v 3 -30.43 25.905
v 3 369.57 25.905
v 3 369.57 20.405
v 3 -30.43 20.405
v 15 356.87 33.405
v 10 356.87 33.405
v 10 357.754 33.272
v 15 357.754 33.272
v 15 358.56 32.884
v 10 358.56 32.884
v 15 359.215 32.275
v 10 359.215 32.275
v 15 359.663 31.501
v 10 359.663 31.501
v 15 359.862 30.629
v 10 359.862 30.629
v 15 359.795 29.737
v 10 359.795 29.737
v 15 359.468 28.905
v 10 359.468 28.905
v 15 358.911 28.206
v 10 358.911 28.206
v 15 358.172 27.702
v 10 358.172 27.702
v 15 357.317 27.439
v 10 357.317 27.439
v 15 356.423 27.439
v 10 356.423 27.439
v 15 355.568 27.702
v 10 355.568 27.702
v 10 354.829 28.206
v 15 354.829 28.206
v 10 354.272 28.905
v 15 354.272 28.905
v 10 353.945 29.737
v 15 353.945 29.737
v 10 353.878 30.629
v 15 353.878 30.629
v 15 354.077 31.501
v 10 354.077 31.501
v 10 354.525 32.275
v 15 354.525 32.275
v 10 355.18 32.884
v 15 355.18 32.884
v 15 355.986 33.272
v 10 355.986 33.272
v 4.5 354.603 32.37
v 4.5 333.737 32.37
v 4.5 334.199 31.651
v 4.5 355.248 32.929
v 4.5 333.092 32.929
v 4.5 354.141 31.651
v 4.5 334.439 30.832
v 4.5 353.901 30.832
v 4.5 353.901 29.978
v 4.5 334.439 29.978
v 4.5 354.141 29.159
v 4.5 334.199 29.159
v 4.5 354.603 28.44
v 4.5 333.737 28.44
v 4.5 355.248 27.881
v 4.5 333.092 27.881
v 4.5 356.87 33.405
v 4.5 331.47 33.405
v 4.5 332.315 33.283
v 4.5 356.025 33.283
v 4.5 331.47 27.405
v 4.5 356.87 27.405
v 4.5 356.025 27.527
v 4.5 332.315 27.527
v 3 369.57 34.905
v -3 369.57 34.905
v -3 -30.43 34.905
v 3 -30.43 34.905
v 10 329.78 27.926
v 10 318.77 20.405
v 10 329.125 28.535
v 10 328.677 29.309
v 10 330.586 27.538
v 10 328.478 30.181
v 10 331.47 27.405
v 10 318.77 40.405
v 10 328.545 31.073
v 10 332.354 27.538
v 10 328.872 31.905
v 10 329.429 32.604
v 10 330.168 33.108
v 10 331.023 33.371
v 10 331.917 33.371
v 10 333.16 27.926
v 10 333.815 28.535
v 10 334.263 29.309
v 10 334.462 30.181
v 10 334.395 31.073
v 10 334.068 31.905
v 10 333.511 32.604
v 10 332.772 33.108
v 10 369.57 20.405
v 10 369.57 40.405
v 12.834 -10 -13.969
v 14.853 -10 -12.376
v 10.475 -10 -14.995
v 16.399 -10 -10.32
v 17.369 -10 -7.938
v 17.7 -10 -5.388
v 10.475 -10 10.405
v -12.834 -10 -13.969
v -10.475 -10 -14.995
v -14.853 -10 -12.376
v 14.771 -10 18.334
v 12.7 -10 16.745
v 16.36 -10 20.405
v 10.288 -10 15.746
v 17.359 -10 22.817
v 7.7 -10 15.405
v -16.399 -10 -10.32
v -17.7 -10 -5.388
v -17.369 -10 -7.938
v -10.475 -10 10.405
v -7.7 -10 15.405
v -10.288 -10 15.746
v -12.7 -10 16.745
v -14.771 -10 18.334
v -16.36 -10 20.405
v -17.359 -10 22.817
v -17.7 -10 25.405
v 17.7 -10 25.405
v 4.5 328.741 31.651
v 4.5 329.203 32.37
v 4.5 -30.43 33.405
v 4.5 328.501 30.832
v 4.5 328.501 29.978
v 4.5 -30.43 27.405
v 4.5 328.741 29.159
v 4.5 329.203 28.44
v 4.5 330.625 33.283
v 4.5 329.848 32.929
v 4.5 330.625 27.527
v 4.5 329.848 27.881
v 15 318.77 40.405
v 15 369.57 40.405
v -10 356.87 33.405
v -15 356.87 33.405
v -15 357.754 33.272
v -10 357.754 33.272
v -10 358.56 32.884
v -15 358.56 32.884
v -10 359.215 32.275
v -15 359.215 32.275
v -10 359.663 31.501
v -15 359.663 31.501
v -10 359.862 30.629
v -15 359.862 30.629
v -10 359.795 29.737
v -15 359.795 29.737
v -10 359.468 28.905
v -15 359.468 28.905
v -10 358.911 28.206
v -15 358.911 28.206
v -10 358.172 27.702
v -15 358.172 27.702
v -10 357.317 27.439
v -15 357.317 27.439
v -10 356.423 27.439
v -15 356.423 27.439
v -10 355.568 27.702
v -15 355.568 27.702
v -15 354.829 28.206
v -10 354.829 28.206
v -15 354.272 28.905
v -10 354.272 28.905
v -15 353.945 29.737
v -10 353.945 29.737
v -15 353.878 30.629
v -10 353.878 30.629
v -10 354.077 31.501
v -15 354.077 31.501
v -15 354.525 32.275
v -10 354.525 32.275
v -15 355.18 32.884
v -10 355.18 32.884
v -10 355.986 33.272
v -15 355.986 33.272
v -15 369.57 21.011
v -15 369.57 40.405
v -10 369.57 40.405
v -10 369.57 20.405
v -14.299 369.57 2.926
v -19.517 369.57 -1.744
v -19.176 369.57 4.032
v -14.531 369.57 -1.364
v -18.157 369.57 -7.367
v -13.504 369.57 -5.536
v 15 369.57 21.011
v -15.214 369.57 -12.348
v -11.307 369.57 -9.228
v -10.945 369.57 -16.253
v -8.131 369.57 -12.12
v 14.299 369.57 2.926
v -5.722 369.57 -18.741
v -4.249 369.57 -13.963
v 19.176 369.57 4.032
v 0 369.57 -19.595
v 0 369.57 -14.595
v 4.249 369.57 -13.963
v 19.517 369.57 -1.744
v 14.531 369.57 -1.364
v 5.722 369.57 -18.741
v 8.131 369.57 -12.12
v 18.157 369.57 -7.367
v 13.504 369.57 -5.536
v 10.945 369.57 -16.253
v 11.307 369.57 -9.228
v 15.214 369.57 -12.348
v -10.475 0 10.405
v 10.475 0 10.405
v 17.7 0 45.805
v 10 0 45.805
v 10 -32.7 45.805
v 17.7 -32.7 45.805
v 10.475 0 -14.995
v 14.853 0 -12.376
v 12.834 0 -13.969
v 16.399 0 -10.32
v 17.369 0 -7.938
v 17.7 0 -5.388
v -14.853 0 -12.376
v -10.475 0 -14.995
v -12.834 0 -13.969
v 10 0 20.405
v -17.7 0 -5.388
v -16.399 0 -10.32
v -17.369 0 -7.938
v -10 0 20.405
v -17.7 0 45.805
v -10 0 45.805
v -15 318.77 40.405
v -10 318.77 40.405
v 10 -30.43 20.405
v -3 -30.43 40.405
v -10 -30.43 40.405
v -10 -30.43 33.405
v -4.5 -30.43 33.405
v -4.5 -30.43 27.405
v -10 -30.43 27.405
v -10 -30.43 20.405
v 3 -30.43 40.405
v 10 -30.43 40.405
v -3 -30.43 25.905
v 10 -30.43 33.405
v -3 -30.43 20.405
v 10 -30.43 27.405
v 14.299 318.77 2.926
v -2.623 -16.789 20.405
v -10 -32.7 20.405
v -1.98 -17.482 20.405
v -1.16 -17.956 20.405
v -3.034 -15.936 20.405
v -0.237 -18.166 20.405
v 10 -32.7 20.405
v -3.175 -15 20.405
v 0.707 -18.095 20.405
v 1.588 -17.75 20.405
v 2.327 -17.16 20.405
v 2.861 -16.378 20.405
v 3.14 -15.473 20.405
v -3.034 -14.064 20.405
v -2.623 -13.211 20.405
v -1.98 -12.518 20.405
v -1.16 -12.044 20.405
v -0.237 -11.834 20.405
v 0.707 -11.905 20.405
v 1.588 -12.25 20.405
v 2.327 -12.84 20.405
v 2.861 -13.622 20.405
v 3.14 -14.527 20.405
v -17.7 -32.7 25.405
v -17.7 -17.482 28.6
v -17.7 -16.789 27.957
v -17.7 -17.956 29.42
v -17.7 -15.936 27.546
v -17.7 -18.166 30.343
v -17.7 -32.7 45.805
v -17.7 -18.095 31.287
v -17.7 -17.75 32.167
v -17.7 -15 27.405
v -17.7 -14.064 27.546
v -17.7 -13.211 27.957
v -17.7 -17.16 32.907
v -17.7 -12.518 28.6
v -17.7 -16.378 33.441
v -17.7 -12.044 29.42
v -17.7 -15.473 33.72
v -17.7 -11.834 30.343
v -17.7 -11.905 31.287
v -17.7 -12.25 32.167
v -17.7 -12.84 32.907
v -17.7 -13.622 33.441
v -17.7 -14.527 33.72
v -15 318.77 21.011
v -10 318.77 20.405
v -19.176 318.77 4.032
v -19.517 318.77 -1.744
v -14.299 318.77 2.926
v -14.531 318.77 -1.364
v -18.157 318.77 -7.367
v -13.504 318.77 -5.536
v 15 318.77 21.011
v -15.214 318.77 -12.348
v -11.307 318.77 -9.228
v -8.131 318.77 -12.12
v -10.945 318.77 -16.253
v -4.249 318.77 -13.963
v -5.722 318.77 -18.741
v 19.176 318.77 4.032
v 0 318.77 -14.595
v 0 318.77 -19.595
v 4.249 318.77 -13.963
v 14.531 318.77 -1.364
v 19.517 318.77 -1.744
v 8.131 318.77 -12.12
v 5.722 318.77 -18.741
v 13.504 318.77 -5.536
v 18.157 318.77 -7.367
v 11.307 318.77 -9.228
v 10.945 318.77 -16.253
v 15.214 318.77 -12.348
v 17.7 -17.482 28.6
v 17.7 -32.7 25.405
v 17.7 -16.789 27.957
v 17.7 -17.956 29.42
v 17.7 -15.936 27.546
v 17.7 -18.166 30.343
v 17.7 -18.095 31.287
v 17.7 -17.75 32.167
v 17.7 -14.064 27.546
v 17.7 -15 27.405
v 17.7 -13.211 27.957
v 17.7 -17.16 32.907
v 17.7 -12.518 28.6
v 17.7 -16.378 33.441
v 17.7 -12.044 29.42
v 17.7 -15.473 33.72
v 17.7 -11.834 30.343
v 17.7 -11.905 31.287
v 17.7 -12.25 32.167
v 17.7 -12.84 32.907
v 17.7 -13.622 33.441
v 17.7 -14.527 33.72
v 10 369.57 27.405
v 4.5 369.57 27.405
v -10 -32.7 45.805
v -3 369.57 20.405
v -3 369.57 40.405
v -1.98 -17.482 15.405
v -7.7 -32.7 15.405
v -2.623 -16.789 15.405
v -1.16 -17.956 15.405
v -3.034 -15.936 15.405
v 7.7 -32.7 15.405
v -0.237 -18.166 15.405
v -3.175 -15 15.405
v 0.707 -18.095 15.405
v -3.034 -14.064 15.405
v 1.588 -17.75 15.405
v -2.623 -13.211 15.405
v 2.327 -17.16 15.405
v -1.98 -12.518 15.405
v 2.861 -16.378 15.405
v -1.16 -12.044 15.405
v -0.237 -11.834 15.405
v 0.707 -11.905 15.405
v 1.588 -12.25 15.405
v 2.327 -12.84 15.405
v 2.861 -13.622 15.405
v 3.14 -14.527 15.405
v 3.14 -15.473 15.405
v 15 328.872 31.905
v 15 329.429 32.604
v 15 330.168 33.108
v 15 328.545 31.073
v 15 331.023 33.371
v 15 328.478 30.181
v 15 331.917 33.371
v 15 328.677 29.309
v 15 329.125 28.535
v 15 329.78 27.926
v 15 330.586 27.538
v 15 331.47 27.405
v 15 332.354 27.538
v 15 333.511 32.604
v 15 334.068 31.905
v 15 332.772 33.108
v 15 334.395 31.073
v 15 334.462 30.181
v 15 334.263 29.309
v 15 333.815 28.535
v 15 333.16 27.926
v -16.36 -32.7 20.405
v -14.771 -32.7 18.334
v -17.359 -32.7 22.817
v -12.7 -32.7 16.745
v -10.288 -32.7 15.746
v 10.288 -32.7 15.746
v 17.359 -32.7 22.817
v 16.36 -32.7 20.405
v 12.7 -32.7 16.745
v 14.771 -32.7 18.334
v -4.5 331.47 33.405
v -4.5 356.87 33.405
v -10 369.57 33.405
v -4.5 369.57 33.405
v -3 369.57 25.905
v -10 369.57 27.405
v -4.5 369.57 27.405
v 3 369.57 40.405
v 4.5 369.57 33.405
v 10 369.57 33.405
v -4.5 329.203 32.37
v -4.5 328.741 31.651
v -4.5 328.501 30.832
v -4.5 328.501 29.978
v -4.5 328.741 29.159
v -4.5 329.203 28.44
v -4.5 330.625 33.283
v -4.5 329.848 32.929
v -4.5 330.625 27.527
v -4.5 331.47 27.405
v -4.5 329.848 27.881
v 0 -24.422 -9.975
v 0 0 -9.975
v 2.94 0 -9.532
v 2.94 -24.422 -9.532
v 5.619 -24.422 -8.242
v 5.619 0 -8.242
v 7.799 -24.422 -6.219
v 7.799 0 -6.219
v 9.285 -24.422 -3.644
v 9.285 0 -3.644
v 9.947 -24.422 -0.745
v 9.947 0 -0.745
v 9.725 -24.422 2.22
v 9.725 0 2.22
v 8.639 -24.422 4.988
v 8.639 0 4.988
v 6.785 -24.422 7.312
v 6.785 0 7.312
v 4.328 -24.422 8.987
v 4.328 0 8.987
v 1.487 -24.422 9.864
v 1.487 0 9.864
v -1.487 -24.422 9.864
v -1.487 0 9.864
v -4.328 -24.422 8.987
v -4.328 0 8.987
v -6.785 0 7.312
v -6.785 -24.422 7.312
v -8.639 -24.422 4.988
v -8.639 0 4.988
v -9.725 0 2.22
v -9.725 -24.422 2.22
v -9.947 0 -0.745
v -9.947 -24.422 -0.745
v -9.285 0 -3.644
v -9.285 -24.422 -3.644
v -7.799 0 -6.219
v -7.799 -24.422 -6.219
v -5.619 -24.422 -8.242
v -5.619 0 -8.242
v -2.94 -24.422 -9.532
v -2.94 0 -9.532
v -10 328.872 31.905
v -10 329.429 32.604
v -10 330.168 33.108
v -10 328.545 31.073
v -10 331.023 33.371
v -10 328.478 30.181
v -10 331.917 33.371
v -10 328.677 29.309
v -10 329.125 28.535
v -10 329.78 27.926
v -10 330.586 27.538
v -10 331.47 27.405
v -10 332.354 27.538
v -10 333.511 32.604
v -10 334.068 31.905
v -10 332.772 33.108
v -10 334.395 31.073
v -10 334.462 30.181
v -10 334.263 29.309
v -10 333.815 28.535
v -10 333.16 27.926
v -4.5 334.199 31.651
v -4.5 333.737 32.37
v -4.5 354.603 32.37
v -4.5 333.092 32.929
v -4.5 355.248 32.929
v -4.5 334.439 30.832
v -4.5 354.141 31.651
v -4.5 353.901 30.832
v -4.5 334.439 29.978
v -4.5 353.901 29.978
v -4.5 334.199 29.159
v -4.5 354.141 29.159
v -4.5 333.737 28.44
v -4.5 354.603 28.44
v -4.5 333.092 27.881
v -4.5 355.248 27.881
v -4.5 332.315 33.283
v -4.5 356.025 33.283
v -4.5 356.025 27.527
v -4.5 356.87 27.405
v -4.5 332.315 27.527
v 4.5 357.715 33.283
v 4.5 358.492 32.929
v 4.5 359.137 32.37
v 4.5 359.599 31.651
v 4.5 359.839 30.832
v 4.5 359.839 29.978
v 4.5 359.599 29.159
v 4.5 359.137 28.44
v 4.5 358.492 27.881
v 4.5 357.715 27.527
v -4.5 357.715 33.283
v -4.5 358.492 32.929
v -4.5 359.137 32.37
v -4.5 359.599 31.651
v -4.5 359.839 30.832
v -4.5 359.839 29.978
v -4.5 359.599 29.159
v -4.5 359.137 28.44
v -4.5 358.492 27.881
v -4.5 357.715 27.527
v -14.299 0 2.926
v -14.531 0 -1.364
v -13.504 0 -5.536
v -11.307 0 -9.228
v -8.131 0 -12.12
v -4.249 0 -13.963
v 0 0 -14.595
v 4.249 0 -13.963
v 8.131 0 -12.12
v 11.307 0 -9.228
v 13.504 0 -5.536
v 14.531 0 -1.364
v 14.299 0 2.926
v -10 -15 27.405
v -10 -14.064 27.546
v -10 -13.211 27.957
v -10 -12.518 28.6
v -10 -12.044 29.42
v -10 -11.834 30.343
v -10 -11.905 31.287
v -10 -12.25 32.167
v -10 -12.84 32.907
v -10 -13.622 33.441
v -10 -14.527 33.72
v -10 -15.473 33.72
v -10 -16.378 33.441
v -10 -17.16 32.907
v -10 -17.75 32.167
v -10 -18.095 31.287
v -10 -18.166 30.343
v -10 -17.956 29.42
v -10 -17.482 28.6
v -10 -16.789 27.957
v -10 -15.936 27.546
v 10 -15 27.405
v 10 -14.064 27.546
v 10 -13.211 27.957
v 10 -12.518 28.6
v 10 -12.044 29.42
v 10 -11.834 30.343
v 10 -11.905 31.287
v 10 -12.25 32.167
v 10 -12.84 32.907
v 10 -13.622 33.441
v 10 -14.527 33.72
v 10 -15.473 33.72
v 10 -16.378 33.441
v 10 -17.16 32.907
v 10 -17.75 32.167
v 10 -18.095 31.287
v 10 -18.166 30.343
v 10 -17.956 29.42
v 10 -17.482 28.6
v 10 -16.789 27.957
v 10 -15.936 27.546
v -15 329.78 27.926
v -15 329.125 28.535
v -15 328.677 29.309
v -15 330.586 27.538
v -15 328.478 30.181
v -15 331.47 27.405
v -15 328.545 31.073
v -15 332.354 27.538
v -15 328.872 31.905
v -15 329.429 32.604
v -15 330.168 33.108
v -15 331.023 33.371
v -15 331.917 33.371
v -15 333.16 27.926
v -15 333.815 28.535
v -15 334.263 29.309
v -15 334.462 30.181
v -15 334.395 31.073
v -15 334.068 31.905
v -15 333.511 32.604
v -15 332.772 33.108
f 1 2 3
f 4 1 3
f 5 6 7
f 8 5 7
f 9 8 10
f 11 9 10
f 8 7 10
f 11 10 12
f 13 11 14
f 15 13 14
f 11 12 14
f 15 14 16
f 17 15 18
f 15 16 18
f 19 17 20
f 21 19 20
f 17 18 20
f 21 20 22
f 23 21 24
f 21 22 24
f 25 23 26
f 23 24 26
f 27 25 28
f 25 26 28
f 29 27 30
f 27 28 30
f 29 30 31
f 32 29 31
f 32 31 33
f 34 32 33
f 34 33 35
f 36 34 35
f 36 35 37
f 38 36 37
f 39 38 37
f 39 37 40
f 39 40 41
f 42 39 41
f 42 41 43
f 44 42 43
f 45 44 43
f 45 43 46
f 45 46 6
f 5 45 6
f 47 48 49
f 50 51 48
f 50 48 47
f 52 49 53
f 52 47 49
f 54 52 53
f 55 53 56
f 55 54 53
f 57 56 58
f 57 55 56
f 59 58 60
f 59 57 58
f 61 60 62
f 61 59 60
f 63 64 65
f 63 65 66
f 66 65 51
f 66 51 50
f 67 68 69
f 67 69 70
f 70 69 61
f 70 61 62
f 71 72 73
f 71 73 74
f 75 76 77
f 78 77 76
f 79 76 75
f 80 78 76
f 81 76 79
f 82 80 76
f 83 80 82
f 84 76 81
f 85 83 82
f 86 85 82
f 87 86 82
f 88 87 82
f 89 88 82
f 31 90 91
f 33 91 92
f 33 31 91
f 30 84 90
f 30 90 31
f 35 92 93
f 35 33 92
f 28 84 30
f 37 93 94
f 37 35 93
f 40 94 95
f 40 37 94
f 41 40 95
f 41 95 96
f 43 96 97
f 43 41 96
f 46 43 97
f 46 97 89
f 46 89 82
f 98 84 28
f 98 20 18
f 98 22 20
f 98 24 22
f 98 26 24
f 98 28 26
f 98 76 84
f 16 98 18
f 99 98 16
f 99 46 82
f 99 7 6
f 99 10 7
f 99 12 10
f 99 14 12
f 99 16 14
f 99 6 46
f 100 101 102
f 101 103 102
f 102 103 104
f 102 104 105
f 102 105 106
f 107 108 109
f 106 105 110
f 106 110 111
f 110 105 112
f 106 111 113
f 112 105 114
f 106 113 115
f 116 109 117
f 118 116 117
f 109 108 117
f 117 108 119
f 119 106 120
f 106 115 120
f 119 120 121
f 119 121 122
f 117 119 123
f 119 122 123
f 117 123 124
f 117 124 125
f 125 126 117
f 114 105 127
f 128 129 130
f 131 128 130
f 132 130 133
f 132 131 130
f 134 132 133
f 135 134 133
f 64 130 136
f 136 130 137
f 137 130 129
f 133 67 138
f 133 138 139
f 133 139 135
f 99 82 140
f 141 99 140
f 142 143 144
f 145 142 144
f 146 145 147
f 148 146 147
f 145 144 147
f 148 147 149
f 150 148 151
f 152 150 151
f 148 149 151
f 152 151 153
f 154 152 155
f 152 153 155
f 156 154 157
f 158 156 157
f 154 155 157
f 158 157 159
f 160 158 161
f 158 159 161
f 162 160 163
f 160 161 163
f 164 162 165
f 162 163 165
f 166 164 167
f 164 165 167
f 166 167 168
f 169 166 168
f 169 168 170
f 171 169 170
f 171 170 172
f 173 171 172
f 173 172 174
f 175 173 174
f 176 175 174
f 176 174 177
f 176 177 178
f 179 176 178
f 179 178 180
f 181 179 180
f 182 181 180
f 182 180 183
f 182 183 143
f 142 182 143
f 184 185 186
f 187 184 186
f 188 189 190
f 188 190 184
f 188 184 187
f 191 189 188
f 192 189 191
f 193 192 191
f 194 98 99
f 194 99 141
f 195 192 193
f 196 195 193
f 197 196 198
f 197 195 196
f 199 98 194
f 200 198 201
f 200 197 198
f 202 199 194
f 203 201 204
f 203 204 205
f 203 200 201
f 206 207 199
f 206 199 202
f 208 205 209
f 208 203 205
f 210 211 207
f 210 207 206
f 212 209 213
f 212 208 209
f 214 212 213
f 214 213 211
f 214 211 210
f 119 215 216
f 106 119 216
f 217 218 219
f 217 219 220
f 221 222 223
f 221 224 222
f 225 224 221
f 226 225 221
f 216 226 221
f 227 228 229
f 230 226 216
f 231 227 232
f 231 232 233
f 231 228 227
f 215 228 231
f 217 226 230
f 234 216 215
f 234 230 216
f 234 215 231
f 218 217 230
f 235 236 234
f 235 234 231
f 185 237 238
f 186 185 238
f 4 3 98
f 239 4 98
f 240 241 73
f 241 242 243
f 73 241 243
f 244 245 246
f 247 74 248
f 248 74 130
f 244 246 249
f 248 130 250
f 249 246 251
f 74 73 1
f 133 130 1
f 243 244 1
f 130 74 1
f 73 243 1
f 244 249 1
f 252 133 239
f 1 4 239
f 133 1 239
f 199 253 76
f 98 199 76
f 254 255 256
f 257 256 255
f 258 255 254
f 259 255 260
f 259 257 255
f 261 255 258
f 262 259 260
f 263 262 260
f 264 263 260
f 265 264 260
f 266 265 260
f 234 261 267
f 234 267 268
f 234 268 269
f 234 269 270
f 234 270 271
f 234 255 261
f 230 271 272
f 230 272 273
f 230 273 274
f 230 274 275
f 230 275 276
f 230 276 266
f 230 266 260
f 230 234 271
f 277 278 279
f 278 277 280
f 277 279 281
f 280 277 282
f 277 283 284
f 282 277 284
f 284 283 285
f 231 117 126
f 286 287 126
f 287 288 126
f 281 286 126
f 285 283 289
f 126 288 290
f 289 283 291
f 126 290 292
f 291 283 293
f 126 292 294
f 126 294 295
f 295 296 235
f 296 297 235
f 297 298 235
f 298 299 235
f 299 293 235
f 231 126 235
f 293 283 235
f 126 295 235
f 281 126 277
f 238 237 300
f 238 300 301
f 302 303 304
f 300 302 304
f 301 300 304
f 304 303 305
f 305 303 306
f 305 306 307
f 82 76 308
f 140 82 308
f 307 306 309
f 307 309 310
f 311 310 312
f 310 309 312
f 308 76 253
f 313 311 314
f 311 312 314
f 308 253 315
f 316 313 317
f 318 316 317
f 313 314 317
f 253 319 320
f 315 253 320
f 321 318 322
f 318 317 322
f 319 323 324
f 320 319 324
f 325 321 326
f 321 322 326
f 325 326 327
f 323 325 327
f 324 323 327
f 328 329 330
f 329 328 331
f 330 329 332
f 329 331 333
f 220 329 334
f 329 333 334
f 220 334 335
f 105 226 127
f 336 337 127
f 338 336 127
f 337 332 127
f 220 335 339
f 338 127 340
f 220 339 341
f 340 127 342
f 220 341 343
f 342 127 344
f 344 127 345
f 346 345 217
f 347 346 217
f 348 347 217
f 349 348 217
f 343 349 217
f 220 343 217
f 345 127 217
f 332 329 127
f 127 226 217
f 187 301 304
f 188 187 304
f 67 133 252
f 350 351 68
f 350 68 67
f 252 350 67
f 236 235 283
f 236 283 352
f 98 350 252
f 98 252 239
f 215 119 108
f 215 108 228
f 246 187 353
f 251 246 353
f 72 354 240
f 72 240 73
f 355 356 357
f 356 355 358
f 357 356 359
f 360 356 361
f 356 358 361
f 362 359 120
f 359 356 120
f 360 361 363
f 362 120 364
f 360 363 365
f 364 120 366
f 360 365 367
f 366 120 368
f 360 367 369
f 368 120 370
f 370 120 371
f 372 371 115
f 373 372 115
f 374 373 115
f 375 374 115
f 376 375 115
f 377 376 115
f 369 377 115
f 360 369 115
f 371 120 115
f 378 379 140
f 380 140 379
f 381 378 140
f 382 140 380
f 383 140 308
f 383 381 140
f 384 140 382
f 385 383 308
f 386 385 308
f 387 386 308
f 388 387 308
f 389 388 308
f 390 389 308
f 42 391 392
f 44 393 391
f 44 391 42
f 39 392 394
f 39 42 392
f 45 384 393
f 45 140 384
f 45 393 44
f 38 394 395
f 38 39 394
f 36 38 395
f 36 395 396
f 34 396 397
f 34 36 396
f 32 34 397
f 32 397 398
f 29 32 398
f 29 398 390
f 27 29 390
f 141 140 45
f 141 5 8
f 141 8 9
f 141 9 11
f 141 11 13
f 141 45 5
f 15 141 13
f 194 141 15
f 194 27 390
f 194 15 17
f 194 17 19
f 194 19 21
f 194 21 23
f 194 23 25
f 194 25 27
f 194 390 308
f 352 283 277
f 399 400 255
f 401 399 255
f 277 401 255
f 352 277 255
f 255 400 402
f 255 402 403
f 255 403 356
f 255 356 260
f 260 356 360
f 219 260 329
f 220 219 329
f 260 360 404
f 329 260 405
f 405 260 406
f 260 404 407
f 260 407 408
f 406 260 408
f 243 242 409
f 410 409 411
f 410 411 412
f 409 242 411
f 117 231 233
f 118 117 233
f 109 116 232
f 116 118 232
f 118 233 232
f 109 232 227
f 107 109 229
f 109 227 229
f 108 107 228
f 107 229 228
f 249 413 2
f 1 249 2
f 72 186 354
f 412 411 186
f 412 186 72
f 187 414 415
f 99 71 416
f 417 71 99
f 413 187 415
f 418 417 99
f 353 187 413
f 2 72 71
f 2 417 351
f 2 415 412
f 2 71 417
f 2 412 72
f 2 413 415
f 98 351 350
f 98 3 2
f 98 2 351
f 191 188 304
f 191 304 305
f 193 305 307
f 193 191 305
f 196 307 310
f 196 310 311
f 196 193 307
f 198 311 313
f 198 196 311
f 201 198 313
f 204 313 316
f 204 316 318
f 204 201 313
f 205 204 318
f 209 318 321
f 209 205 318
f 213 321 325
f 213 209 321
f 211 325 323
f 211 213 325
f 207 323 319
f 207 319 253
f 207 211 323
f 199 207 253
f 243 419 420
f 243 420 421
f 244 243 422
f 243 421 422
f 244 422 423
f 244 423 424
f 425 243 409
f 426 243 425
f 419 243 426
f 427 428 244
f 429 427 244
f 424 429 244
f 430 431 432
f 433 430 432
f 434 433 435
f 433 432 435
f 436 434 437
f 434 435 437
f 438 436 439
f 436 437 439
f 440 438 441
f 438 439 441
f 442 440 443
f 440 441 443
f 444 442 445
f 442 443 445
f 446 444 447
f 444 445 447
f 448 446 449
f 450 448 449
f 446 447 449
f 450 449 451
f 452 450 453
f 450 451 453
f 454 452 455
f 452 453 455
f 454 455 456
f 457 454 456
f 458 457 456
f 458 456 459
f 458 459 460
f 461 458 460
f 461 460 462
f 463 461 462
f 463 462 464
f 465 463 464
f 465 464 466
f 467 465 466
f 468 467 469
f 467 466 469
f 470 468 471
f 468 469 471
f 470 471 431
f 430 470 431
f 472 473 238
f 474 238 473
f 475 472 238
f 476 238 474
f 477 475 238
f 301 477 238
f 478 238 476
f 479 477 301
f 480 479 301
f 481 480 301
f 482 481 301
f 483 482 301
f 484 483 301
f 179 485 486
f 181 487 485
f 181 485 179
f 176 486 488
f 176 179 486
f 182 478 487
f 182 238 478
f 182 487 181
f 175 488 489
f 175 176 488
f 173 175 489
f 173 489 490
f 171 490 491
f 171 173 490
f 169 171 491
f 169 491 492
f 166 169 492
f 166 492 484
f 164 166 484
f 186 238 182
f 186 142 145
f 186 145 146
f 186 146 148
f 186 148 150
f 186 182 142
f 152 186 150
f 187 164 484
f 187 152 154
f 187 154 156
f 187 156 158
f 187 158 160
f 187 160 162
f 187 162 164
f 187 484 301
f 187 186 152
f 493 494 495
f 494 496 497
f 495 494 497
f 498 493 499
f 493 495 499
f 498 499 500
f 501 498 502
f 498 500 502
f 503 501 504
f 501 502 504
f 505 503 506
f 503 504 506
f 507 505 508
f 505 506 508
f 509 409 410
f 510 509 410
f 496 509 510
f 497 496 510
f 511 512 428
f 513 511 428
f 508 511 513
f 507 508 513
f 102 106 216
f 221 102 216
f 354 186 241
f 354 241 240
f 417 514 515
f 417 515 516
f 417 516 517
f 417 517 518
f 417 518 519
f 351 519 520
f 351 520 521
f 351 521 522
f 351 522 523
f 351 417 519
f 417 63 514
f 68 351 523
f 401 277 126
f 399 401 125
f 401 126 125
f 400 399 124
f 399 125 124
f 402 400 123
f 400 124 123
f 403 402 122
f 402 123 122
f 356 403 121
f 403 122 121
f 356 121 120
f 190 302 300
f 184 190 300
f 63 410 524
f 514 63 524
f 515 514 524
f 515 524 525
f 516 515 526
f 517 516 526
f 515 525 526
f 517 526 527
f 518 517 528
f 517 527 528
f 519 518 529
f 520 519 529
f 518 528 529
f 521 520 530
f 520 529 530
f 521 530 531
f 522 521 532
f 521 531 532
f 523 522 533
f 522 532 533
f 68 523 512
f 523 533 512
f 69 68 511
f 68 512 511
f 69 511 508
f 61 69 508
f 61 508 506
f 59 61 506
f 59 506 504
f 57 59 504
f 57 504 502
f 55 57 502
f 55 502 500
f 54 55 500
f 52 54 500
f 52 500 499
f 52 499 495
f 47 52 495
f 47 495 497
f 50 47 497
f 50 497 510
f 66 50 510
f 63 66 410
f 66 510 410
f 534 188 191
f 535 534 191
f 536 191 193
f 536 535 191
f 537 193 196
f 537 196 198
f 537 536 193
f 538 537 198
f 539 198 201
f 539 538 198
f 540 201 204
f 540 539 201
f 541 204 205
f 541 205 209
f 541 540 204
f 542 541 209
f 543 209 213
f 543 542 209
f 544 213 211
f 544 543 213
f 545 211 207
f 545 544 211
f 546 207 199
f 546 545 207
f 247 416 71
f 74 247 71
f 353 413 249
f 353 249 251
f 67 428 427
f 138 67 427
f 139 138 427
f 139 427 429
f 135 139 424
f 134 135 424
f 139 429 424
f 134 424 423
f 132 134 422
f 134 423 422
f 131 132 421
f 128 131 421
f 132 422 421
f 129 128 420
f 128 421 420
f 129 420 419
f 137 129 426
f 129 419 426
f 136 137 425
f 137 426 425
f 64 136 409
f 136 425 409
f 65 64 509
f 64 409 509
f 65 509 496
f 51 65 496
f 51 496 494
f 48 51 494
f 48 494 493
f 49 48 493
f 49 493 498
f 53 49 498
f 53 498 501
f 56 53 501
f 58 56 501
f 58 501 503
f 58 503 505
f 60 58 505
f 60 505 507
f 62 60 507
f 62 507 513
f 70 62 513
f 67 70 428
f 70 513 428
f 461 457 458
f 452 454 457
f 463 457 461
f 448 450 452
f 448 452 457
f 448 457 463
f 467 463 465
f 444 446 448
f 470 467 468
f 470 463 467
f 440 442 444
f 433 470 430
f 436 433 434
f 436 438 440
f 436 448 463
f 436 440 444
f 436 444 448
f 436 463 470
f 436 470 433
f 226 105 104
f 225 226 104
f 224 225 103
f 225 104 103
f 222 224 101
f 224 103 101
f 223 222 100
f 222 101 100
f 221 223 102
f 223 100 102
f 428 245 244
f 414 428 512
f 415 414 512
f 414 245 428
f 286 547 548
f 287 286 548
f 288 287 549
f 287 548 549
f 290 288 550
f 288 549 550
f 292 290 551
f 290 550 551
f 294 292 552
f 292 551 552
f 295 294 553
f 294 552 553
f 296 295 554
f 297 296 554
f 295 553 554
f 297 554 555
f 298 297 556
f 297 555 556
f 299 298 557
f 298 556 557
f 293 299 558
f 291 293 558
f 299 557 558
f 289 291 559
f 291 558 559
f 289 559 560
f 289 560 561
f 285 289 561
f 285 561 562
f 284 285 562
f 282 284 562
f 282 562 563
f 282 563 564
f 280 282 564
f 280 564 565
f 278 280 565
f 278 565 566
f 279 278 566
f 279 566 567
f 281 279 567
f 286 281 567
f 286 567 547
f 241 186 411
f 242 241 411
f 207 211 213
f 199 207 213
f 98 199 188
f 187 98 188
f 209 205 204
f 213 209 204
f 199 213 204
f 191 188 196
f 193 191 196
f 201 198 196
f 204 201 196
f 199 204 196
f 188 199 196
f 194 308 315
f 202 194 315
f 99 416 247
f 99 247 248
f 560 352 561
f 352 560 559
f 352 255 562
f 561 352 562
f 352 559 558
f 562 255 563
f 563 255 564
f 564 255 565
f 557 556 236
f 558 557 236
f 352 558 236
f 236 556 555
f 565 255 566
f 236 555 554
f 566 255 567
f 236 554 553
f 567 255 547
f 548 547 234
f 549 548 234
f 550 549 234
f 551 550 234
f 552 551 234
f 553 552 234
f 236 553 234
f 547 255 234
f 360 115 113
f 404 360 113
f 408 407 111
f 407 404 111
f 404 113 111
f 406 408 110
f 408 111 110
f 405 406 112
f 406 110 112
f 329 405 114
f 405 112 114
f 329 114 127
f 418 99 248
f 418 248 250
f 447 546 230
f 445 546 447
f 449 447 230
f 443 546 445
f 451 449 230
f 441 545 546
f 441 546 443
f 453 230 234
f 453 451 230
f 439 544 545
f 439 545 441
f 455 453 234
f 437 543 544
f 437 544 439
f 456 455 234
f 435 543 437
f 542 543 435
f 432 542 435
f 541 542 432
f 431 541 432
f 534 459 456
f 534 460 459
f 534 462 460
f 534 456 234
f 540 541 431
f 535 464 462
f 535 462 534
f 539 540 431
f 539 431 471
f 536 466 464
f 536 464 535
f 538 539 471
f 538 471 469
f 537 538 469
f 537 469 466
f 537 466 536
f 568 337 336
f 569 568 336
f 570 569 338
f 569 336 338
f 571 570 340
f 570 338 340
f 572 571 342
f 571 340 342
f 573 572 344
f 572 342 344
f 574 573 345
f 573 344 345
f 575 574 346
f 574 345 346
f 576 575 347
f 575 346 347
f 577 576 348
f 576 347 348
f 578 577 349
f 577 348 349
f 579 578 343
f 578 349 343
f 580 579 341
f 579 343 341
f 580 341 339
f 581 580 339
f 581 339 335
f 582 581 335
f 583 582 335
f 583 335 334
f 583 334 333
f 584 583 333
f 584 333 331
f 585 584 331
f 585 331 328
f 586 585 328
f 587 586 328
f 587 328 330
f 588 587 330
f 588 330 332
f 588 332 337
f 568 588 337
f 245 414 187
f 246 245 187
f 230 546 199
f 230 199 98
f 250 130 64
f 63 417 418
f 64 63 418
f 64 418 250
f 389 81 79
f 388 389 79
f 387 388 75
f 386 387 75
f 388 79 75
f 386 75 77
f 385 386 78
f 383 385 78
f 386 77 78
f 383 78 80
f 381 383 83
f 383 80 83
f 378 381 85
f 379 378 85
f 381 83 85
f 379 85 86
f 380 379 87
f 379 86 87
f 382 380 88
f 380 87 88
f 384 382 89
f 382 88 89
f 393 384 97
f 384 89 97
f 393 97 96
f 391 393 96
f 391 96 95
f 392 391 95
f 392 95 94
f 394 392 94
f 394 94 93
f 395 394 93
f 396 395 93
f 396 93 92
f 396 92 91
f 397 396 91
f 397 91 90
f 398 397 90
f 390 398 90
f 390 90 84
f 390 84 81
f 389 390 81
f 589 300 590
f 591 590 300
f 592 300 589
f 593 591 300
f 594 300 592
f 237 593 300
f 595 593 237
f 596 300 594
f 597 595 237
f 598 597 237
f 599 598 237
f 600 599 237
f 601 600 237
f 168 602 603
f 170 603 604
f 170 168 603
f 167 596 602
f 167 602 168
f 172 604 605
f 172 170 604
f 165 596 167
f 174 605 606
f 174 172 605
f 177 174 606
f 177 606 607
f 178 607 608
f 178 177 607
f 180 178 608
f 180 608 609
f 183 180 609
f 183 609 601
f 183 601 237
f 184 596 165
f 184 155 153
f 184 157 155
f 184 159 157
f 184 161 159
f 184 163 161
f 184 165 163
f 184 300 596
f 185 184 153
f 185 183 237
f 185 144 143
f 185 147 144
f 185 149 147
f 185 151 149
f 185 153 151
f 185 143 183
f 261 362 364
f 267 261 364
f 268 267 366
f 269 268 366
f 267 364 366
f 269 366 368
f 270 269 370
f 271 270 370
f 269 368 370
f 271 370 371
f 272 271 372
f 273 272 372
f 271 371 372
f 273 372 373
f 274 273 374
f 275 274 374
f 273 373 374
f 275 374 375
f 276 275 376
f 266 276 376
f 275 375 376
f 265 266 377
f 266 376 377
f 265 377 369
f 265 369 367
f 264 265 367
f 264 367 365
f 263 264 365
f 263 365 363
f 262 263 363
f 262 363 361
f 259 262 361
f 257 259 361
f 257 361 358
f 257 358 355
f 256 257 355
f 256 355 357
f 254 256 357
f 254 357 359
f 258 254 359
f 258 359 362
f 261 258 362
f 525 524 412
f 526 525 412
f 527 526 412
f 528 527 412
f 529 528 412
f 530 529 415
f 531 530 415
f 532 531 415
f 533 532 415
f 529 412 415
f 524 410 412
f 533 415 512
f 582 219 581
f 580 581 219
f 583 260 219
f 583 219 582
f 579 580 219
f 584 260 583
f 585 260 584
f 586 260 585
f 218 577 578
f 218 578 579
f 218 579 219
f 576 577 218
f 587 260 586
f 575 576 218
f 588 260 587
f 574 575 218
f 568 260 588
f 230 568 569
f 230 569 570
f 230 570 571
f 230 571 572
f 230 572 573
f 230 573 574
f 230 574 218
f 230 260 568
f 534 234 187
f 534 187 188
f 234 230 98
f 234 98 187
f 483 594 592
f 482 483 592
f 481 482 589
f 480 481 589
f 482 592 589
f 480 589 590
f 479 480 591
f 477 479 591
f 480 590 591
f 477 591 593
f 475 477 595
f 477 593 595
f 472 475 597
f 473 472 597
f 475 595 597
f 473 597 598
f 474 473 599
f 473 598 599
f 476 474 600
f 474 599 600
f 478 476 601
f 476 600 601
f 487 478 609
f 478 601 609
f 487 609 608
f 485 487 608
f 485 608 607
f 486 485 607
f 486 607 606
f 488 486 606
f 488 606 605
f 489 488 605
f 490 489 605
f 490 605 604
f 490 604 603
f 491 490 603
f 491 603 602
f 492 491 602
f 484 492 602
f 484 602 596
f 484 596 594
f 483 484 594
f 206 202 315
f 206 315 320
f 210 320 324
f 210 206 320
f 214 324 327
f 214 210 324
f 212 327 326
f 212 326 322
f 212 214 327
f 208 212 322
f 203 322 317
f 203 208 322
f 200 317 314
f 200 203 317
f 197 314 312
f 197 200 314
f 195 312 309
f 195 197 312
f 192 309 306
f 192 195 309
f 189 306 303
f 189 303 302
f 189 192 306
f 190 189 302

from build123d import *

# Parameters (mm, degrees)
BOSS_EXTRUDE1_DEPTH = 369.57
SKETCH2_W           = 20
SKETCH2_H           = 20
BOSS_EXTRUDE2_DEPTH = 400
SKETCH7_W           = 5.5
SKETCH7_H           = 6
SKETCH7_W_2         = 6
SKETCH7_H_2         = 5.5
CUT_EXTRUDE3_DEPTH  = 403.300358004
BOSS_EXTRUDE3_DEPTH = 50.8
SKETCH9_R           = 3
CUT_EXTRUDE4_DEPTH  = 374.378310765
SKETCH10_R          = 9.975
BOSS_EXTRUDE4_DEPTH = 24.4221
SKETCH11_W          = 35.4
SKETCH11_H          = 10
BOSS_EXTRUDE5_DEPTH = 10
SKETCH12_W          = 35.4
SKETCH12_H          = 5
BOSS_EXTRUDE6_DEPTH = 22.7
SKETCH14_R          = 3.175
CUT_EXTRUDE5_DEPTH  = 372.74043219
SKETCH15_W          = 7.7
SKETCH15_H          = 32.7
BOSS_EXTRUDE7_DEPTH = 25.4
SKETCH16_R          = 3.175
CUT_EXTRUDE6_DEPTH  = 375.260604325
SKETCH17_W          = 7.225
SKETCH17_H          = 10
BOSS_EXTRUDE8_DEPTH = 25.4
FILLET1_R           = 10


with BuildPart() as part:
    # Sketch1 → Boss-Extrude1 (new body)
    with BuildSketch(Plane(origin=(0, 0, 0), x_dir=(1, 0, 0), z_dir=(0, 1, 0))):
        with BuildLine():
            Line((14.298722896, -2.925841512), (10, -20.405))
            Line((10, -20.405), (-10, -20.405))
            Line((-10, -20.405), (-14.298722896, -2.925841512))
            ThreePointArc((-14.298722896, -2.925841512), (0, 14.595), (14.298722896, -2.925841512))
        make_face()
    extrude(amount=BOSS_EXTRUDE1_DEPTH)

    # Sketch10 → Boss-Extrude4 (add)
    with BuildSketch(Plane.XZ):
        with Locations(Location((0, 0, 0), (0, 0, 270))):
            Circle(SKETCH10_R)
    extrude(amount=BOSS_EXTRUDE4_DEPTH)


with BuildPart() as body_2:
    # Sketch2 → Boss-Extrude2 (new body)
    with BuildSketch(Plane(origin=(0, 369.57, 0), x_dir=(1, 0, 0), z_dir=(0, 1, 0))):
        with Locations((0, -30.405)):
            Rectangle(SKETCH2_W, SKETCH2_H)
    extrude(amount=-BOSS_EXTRUDE2_DEPTH)

    # Sketch7 → Cut-Extrude3 (cut, through all)
    with BuildSketch(Plane(origin=(0, 369.57, 0), x_dir=(1, 0, 0), z_dir=(0, 1, 0))):
        with Locations((7.25, -30.405)):
            Rectangle(SKETCH7_W, SKETCH7_H)
        with Locations((-7.25, -30.405)):
            Rectangle(SKETCH7_W, SKETCH7_H)
        with Locations((0, -23.155)):
            Rectangle(SKETCH7_W_2, SKETCH7_H_2)
        with Locations((0, -37.655)):
            Rectangle(SKETCH7_W_2, SKETCH7_H_2)
    extrude(amount=-CUT_EXTRUDE3_DEPTH, mode=Mode.SUBTRACT)


with BuildPart() as body_3:
    # Sketch8 → Boss-Extrude3 (new body)
    with BuildSketch(Plane(origin=(0, 369.57, 0), x_dir=(1, 0, 0), z_dir=(0, 1, 0))):
        with BuildLine():
            Line((-10, -40.405), (-10, -20.405))
            Line((-10, -20.405), (-14.298722896, -2.925841512))
            ThreePointArc((-14.298722896, -2.925841512), (0, 14.595), (14.298722896, -2.925841512))
            Line((14.298722896, -2.925841512), (10, -20.405))
            Line((10, -20.405), (10, -40.405))
            Line((10, -40.405), (15, -40.405))
            Line((15, -40.405), (15, -21.010809591))
            Line((15, -21.010809591), (19.175792464, -4.031502))
            ThreePointArc((19.175792464, -4.031502), (0, 19.595), (-19.175792464, -4.031502))
            Line((-19.175792464, -4.031502), (-15, -21.010809591))
            Line((-15, -21.010809591), (-15, -40.405))
            Line((-15, -40.405), (-10, -40.405))
        make_face()
    extrude(amount=-BOSS_EXTRUDE3_DEPTH)


with BuildPart() as cut_extrude4_tool:
    # Sketch9 → Cut-Extrude4 (new, through all)
    with BuildSketch(Plane.ZY.offset(15)):
        with Locations((30.405, 356.87)):
            Circle(SKETCH9_R)
        with Locations(Location((30.405, 331.47, 0), (0, 0, 180))):
            Circle(SKETCH9_R)
    extrude(amount=-CUT_EXTRUDE4_DEPTH)


with BuildPart() as body_2_1:
    add(body_2.part)

    # Cut-Extrude4: cut by cut_extrude4_tool
    add(cut_extrude4_tool.part, mode=Mode.SUBTRACT)


with BuildPart() as body_3_1:
    add(body_3.part)

    # Cut-Extrude4: cut by cut_extrude4_tool
    add(cut_extrude4_tool.part, mode=Mode.SUBTRACT)


with BuildPart() as body_4:
    # Sketch11 → Boss-Extrude5 (new body)
    with BuildSketch(Plane.XZ):
        with Locations((0, 15.405)):
            Rectangle(SKETCH11_W, SKETCH11_H)
    extrude(amount=BOSS_EXTRUDE5_DEPTH)

    # Sketch12 → Boss-Extrude6 (add)
    with BuildSketch(Plane.XZ.offset(10)):
        with Locations((0, 17.905)):
            Rectangle(SKETCH12_W, SKETCH12_H)
    extrude(amount=BOSS_EXTRUDE6_DEPTH)

    # Sketch14 → Cut-Extrude5 (cut, through all)
    with BuildSketch(Plane(origin=(0, 0, 15.405), x_dir=(-1, 0, 0), z_dir=(0, 0, -1))):
        with Locations((0, -15)):
            Circle(SKETCH14_R)
    extrude(amount=-CUT_EXTRUDE5_DEPTH, mode=Mode.SUBTRACT)

    # Sketch15 → Boss-Extrude7 (add)
    with BuildSketch(Plane.XY.offset(20.405)):
        with Locations((-13.85, -16.35)):
            Rectangle(SKETCH15_W, SKETCH15_H)
        with Locations((13.85, -16.35)):
            Rectangle(SKETCH15_W, SKETCH15_H)
    extrude(amount=BOSS_EXTRUDE7_DEPTH)

    # Sketch16 → Cut-Extrude6 (cut, through all)
    with BuildSketch(Plane(origin=(17.7, 0, 0), x_dir=(0, 0, -1), z_dir=(1, 0, 0))):
        with Locations((-30.58, -15)):
            Circle(SKETCH16_R)
    extrude(amount=-CUT_EXTRUDE6_DEPTH, mode=Mode.SUBTRACT)

    # Sketch17 → Boss-Extrude8 (add)
    with BuildSketch(Plane(origin=(0, 0, 10.405), x_dir=(-1, 0, 0), z_dir=(0, 0, -1))):
        with Locations((14.0875, -5)):
            Rectangle(SKETCH17_W, SKETCH17_H)
        with Locations((-14.0875, -5)):
            Rectangle(SKETCH17_W, SKETCH17_H)
    extrude(amount=BOSS_EXTRUDE8_DEPTH)

    # Fillet1
    # the kernel refuses this fillet: 10 mm, written as the material it takes off along each edge
    with BuildSketch(Plane(origin=(17.7, -10, 15.405), x_dir=(0, 0, 1), z_dir=(0, -1, 0))) as fillet1_piece_1:
        with BuildLine():
            CenterArc((FILLET1_R, FILLET1_R), FILLET1_R, 180, 90)
            Line((0, FILLET1_R), (0, 0))
            Line((0, 0), (FILLET1_R, 0))
        make_face()
    extrude(amount=47.7, mode=Mode.SUBTRACT)
    with BuildSketch(Plane(origin=(-17.7, -10, 15.405), x_dir=(0, 0, 1), z_dir=(0, -1, 0))) as fillet1_piece_2:
        with BuildLine():
            CenterArc((FILLET1_R, -FILLET1_R), FILLET1_R, 90, 90)
            Line((0, -FILLET1_R), (0, 0))
            Line((0, 0), (FILLET1_R, 0))
        make_face()
    extrude(amount=47.7, mode=Mode.SUBTRACT)
    with BuildSketch(Plane(origin=(17.7, -34.01814093, -14.995), x_dir=(0, 0, 1), z_dir=(0, 1, 0))) as fillet1_piece_3:
        with BuildLine():
            CenterArc((9.607256372, -10), FILLET1_R, 90, 73.888946597)
            Line((0, -7.225), (0, 0))
            Line((0, 0), (9.607256372, 0))
        make_face()
    extrude(amount=58.036281861, mode=Mode.SUBTRACT)
    with BuildSketch(Plane(origin=(-17.7, 24.01814093, -14.995), x_dir=(1, 0, 0), z_dir=(0, -1, 0))) as fillet1_piece_4:
        with BuildLine():
            CenterArc((10, 9.607256372), FILLET1_R, 180, 73.888946597)
            Line((0, 9.607256372), (0, 0))
            Line((0, 0), (7.225, 0))
        make_face()
    extrude(amount=58.036281861, mode=Mode.SUBTRACT)


solid = Compound([part.part, body_2_1.part, body_3_1.part, body_4.part])
